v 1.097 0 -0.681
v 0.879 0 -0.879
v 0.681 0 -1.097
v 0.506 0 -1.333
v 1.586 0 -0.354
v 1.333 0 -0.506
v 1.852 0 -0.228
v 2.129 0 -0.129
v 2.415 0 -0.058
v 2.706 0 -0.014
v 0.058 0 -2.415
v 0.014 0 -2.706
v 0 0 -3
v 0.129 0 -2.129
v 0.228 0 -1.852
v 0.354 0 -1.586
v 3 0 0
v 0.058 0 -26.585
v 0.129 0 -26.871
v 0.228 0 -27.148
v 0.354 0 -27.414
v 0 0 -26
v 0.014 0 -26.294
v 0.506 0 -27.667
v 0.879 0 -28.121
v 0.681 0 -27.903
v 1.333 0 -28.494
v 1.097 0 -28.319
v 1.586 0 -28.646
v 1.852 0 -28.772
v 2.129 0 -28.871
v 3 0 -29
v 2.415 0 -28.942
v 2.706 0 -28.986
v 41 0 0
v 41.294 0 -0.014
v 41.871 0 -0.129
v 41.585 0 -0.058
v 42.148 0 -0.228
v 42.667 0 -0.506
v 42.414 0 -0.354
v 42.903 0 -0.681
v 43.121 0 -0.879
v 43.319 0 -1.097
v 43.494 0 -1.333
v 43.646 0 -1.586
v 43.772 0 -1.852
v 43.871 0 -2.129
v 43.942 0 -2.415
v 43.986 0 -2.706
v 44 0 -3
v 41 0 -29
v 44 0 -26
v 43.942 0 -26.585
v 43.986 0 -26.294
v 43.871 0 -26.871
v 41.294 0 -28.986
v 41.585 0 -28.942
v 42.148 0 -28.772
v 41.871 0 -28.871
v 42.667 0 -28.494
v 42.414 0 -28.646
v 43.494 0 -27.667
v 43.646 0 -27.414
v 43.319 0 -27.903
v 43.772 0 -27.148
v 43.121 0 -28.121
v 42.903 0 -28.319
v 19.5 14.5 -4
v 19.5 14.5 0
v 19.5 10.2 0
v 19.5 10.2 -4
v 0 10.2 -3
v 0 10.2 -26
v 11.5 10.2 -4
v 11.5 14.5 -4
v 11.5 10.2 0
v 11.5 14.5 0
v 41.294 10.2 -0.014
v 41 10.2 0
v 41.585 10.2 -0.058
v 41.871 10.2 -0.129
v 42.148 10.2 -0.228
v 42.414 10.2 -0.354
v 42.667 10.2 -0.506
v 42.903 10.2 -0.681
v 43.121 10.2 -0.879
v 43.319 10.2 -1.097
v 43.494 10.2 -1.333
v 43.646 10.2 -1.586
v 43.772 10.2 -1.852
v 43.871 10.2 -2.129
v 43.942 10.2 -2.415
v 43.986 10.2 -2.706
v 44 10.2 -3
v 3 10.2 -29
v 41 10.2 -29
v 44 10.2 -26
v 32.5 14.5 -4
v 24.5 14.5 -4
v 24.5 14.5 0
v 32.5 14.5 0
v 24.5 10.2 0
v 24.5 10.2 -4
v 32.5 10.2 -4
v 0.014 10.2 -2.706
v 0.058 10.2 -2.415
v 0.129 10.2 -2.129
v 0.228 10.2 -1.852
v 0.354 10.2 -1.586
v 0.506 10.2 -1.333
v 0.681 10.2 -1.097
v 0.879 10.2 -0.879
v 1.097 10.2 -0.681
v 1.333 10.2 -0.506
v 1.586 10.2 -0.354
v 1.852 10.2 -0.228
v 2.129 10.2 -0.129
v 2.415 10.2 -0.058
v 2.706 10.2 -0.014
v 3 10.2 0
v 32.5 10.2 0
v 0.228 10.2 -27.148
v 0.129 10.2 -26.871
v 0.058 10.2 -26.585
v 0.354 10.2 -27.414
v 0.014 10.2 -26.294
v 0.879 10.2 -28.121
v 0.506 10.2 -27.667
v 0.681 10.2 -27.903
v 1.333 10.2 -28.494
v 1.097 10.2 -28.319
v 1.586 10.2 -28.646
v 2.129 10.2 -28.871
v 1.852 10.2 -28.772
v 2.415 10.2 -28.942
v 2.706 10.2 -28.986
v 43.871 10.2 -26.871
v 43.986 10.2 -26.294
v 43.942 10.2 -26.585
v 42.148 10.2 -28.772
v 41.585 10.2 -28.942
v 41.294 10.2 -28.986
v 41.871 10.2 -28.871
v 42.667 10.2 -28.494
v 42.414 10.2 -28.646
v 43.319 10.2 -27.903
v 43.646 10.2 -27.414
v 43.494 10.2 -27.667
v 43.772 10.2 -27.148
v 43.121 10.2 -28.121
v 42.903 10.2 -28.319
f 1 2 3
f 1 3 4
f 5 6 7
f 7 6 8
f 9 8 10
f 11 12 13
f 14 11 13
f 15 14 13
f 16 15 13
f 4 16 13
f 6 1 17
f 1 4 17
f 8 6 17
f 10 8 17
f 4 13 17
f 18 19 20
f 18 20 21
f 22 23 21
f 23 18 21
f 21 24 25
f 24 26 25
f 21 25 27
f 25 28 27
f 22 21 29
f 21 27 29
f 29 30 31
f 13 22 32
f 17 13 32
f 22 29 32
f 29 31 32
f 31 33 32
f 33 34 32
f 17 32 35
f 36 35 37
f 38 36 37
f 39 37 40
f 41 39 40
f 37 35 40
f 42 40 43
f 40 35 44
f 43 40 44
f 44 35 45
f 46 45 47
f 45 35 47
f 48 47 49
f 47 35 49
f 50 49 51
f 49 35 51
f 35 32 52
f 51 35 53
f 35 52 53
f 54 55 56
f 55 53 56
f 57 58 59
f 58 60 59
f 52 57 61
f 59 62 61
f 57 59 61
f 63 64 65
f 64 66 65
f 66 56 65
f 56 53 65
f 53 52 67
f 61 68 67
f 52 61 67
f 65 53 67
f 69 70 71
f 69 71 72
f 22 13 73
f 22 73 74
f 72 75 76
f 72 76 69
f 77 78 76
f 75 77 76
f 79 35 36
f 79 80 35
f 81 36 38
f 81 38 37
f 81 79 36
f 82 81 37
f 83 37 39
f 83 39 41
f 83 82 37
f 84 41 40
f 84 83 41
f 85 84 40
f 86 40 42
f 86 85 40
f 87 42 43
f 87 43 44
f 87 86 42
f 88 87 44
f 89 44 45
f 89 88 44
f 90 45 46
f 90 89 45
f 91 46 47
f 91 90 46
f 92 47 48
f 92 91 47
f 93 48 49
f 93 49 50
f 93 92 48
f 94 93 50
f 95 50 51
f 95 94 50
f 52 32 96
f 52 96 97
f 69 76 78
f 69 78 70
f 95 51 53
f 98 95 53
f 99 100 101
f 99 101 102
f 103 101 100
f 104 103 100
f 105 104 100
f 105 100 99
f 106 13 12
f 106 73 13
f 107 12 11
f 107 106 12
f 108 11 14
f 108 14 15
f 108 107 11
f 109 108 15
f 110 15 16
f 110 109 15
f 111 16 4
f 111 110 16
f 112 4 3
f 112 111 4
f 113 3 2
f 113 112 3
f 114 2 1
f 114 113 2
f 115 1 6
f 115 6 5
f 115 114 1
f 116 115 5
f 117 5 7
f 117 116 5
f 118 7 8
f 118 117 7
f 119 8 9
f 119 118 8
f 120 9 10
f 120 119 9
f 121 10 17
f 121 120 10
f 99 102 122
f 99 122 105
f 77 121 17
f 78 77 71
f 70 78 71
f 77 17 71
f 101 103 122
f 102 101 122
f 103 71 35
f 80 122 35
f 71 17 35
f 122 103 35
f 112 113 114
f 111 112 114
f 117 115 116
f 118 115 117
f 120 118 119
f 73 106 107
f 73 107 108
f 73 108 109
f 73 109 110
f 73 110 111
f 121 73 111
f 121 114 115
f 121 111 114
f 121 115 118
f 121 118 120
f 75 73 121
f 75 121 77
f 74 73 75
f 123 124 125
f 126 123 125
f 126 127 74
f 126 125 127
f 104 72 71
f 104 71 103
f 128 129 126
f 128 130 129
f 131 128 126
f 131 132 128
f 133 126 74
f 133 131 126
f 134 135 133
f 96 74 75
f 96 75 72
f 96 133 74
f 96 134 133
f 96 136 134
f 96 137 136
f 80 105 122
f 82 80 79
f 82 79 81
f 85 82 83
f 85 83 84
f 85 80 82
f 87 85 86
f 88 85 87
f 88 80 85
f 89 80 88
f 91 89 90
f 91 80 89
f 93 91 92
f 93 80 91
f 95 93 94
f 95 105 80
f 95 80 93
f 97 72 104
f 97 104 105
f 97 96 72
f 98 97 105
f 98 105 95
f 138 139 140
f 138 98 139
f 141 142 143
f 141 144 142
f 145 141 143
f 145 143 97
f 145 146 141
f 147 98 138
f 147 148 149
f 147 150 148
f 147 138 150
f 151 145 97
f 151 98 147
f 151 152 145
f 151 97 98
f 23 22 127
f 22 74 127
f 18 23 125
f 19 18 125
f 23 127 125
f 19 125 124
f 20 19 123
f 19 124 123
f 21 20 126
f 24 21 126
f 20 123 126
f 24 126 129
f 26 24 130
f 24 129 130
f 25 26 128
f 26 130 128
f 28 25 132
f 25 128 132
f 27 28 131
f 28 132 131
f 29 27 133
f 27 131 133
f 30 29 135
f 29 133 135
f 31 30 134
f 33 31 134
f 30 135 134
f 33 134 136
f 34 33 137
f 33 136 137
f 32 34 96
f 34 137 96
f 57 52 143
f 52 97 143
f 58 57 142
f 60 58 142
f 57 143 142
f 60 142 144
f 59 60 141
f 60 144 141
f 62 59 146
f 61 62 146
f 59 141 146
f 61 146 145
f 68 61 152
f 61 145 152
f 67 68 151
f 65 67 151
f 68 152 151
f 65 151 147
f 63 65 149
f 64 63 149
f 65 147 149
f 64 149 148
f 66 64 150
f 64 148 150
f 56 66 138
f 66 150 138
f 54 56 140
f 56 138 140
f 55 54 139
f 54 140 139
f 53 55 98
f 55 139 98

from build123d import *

# Parameters (mm, degrees)
SKETCH1_W           = 44
SKETCH1_H           = 29
BOSS_EXTRUDE1_DEPTH = 10.2
SKETCH2_W           = 8
SKETCH2_H           = 4
BOSS_EXTRUDE2_DEPTH = 4.3
FILLET1_R           = 3


with BuildPart() as part:
    # Sketch1 → Boss-Extrude1 (new body)
    with BuildSketch(Plane(origin=(0, 0, 0), x_dir=(1, 0, 0), z_dir=(0, 1, 0))):
        with Locations((22, 14.5)):
            Rectangle(SKETCH1_W, SKETCH1_H)
    extrude(amount=BOSS_EXTRUDE1_DEPTH)

    # Sketch2 → Boss-Extrude2 (add)
    with BuildSketch(Plane(origin=(0, 10.2, 0), x_dir=(1, 0, 0), z_dir=(0, 1, 0))):
        with Locations((28.5, 2)):
            Rectangle(SKETCH2_W, SKETCH2_H)
        with Locations((15.5, 2)):
            Rectangle(SKETCH2_W, SKETCH2_H)
    extrude(amount=BOSS_EXTRUDE2_DEPTH)

    # Fillet1
    fillet1_edges = [part.edges().sort_by_distance(p)[0] for p in [
        (0, 5.1, -29),
        (44, 5.1, -29),
        (44, 5.1, 0),
        (0, 5.1, 0),
    ]]
    fillet(fillet1_edges, radius=FILLET1_R)


solid = part.part
